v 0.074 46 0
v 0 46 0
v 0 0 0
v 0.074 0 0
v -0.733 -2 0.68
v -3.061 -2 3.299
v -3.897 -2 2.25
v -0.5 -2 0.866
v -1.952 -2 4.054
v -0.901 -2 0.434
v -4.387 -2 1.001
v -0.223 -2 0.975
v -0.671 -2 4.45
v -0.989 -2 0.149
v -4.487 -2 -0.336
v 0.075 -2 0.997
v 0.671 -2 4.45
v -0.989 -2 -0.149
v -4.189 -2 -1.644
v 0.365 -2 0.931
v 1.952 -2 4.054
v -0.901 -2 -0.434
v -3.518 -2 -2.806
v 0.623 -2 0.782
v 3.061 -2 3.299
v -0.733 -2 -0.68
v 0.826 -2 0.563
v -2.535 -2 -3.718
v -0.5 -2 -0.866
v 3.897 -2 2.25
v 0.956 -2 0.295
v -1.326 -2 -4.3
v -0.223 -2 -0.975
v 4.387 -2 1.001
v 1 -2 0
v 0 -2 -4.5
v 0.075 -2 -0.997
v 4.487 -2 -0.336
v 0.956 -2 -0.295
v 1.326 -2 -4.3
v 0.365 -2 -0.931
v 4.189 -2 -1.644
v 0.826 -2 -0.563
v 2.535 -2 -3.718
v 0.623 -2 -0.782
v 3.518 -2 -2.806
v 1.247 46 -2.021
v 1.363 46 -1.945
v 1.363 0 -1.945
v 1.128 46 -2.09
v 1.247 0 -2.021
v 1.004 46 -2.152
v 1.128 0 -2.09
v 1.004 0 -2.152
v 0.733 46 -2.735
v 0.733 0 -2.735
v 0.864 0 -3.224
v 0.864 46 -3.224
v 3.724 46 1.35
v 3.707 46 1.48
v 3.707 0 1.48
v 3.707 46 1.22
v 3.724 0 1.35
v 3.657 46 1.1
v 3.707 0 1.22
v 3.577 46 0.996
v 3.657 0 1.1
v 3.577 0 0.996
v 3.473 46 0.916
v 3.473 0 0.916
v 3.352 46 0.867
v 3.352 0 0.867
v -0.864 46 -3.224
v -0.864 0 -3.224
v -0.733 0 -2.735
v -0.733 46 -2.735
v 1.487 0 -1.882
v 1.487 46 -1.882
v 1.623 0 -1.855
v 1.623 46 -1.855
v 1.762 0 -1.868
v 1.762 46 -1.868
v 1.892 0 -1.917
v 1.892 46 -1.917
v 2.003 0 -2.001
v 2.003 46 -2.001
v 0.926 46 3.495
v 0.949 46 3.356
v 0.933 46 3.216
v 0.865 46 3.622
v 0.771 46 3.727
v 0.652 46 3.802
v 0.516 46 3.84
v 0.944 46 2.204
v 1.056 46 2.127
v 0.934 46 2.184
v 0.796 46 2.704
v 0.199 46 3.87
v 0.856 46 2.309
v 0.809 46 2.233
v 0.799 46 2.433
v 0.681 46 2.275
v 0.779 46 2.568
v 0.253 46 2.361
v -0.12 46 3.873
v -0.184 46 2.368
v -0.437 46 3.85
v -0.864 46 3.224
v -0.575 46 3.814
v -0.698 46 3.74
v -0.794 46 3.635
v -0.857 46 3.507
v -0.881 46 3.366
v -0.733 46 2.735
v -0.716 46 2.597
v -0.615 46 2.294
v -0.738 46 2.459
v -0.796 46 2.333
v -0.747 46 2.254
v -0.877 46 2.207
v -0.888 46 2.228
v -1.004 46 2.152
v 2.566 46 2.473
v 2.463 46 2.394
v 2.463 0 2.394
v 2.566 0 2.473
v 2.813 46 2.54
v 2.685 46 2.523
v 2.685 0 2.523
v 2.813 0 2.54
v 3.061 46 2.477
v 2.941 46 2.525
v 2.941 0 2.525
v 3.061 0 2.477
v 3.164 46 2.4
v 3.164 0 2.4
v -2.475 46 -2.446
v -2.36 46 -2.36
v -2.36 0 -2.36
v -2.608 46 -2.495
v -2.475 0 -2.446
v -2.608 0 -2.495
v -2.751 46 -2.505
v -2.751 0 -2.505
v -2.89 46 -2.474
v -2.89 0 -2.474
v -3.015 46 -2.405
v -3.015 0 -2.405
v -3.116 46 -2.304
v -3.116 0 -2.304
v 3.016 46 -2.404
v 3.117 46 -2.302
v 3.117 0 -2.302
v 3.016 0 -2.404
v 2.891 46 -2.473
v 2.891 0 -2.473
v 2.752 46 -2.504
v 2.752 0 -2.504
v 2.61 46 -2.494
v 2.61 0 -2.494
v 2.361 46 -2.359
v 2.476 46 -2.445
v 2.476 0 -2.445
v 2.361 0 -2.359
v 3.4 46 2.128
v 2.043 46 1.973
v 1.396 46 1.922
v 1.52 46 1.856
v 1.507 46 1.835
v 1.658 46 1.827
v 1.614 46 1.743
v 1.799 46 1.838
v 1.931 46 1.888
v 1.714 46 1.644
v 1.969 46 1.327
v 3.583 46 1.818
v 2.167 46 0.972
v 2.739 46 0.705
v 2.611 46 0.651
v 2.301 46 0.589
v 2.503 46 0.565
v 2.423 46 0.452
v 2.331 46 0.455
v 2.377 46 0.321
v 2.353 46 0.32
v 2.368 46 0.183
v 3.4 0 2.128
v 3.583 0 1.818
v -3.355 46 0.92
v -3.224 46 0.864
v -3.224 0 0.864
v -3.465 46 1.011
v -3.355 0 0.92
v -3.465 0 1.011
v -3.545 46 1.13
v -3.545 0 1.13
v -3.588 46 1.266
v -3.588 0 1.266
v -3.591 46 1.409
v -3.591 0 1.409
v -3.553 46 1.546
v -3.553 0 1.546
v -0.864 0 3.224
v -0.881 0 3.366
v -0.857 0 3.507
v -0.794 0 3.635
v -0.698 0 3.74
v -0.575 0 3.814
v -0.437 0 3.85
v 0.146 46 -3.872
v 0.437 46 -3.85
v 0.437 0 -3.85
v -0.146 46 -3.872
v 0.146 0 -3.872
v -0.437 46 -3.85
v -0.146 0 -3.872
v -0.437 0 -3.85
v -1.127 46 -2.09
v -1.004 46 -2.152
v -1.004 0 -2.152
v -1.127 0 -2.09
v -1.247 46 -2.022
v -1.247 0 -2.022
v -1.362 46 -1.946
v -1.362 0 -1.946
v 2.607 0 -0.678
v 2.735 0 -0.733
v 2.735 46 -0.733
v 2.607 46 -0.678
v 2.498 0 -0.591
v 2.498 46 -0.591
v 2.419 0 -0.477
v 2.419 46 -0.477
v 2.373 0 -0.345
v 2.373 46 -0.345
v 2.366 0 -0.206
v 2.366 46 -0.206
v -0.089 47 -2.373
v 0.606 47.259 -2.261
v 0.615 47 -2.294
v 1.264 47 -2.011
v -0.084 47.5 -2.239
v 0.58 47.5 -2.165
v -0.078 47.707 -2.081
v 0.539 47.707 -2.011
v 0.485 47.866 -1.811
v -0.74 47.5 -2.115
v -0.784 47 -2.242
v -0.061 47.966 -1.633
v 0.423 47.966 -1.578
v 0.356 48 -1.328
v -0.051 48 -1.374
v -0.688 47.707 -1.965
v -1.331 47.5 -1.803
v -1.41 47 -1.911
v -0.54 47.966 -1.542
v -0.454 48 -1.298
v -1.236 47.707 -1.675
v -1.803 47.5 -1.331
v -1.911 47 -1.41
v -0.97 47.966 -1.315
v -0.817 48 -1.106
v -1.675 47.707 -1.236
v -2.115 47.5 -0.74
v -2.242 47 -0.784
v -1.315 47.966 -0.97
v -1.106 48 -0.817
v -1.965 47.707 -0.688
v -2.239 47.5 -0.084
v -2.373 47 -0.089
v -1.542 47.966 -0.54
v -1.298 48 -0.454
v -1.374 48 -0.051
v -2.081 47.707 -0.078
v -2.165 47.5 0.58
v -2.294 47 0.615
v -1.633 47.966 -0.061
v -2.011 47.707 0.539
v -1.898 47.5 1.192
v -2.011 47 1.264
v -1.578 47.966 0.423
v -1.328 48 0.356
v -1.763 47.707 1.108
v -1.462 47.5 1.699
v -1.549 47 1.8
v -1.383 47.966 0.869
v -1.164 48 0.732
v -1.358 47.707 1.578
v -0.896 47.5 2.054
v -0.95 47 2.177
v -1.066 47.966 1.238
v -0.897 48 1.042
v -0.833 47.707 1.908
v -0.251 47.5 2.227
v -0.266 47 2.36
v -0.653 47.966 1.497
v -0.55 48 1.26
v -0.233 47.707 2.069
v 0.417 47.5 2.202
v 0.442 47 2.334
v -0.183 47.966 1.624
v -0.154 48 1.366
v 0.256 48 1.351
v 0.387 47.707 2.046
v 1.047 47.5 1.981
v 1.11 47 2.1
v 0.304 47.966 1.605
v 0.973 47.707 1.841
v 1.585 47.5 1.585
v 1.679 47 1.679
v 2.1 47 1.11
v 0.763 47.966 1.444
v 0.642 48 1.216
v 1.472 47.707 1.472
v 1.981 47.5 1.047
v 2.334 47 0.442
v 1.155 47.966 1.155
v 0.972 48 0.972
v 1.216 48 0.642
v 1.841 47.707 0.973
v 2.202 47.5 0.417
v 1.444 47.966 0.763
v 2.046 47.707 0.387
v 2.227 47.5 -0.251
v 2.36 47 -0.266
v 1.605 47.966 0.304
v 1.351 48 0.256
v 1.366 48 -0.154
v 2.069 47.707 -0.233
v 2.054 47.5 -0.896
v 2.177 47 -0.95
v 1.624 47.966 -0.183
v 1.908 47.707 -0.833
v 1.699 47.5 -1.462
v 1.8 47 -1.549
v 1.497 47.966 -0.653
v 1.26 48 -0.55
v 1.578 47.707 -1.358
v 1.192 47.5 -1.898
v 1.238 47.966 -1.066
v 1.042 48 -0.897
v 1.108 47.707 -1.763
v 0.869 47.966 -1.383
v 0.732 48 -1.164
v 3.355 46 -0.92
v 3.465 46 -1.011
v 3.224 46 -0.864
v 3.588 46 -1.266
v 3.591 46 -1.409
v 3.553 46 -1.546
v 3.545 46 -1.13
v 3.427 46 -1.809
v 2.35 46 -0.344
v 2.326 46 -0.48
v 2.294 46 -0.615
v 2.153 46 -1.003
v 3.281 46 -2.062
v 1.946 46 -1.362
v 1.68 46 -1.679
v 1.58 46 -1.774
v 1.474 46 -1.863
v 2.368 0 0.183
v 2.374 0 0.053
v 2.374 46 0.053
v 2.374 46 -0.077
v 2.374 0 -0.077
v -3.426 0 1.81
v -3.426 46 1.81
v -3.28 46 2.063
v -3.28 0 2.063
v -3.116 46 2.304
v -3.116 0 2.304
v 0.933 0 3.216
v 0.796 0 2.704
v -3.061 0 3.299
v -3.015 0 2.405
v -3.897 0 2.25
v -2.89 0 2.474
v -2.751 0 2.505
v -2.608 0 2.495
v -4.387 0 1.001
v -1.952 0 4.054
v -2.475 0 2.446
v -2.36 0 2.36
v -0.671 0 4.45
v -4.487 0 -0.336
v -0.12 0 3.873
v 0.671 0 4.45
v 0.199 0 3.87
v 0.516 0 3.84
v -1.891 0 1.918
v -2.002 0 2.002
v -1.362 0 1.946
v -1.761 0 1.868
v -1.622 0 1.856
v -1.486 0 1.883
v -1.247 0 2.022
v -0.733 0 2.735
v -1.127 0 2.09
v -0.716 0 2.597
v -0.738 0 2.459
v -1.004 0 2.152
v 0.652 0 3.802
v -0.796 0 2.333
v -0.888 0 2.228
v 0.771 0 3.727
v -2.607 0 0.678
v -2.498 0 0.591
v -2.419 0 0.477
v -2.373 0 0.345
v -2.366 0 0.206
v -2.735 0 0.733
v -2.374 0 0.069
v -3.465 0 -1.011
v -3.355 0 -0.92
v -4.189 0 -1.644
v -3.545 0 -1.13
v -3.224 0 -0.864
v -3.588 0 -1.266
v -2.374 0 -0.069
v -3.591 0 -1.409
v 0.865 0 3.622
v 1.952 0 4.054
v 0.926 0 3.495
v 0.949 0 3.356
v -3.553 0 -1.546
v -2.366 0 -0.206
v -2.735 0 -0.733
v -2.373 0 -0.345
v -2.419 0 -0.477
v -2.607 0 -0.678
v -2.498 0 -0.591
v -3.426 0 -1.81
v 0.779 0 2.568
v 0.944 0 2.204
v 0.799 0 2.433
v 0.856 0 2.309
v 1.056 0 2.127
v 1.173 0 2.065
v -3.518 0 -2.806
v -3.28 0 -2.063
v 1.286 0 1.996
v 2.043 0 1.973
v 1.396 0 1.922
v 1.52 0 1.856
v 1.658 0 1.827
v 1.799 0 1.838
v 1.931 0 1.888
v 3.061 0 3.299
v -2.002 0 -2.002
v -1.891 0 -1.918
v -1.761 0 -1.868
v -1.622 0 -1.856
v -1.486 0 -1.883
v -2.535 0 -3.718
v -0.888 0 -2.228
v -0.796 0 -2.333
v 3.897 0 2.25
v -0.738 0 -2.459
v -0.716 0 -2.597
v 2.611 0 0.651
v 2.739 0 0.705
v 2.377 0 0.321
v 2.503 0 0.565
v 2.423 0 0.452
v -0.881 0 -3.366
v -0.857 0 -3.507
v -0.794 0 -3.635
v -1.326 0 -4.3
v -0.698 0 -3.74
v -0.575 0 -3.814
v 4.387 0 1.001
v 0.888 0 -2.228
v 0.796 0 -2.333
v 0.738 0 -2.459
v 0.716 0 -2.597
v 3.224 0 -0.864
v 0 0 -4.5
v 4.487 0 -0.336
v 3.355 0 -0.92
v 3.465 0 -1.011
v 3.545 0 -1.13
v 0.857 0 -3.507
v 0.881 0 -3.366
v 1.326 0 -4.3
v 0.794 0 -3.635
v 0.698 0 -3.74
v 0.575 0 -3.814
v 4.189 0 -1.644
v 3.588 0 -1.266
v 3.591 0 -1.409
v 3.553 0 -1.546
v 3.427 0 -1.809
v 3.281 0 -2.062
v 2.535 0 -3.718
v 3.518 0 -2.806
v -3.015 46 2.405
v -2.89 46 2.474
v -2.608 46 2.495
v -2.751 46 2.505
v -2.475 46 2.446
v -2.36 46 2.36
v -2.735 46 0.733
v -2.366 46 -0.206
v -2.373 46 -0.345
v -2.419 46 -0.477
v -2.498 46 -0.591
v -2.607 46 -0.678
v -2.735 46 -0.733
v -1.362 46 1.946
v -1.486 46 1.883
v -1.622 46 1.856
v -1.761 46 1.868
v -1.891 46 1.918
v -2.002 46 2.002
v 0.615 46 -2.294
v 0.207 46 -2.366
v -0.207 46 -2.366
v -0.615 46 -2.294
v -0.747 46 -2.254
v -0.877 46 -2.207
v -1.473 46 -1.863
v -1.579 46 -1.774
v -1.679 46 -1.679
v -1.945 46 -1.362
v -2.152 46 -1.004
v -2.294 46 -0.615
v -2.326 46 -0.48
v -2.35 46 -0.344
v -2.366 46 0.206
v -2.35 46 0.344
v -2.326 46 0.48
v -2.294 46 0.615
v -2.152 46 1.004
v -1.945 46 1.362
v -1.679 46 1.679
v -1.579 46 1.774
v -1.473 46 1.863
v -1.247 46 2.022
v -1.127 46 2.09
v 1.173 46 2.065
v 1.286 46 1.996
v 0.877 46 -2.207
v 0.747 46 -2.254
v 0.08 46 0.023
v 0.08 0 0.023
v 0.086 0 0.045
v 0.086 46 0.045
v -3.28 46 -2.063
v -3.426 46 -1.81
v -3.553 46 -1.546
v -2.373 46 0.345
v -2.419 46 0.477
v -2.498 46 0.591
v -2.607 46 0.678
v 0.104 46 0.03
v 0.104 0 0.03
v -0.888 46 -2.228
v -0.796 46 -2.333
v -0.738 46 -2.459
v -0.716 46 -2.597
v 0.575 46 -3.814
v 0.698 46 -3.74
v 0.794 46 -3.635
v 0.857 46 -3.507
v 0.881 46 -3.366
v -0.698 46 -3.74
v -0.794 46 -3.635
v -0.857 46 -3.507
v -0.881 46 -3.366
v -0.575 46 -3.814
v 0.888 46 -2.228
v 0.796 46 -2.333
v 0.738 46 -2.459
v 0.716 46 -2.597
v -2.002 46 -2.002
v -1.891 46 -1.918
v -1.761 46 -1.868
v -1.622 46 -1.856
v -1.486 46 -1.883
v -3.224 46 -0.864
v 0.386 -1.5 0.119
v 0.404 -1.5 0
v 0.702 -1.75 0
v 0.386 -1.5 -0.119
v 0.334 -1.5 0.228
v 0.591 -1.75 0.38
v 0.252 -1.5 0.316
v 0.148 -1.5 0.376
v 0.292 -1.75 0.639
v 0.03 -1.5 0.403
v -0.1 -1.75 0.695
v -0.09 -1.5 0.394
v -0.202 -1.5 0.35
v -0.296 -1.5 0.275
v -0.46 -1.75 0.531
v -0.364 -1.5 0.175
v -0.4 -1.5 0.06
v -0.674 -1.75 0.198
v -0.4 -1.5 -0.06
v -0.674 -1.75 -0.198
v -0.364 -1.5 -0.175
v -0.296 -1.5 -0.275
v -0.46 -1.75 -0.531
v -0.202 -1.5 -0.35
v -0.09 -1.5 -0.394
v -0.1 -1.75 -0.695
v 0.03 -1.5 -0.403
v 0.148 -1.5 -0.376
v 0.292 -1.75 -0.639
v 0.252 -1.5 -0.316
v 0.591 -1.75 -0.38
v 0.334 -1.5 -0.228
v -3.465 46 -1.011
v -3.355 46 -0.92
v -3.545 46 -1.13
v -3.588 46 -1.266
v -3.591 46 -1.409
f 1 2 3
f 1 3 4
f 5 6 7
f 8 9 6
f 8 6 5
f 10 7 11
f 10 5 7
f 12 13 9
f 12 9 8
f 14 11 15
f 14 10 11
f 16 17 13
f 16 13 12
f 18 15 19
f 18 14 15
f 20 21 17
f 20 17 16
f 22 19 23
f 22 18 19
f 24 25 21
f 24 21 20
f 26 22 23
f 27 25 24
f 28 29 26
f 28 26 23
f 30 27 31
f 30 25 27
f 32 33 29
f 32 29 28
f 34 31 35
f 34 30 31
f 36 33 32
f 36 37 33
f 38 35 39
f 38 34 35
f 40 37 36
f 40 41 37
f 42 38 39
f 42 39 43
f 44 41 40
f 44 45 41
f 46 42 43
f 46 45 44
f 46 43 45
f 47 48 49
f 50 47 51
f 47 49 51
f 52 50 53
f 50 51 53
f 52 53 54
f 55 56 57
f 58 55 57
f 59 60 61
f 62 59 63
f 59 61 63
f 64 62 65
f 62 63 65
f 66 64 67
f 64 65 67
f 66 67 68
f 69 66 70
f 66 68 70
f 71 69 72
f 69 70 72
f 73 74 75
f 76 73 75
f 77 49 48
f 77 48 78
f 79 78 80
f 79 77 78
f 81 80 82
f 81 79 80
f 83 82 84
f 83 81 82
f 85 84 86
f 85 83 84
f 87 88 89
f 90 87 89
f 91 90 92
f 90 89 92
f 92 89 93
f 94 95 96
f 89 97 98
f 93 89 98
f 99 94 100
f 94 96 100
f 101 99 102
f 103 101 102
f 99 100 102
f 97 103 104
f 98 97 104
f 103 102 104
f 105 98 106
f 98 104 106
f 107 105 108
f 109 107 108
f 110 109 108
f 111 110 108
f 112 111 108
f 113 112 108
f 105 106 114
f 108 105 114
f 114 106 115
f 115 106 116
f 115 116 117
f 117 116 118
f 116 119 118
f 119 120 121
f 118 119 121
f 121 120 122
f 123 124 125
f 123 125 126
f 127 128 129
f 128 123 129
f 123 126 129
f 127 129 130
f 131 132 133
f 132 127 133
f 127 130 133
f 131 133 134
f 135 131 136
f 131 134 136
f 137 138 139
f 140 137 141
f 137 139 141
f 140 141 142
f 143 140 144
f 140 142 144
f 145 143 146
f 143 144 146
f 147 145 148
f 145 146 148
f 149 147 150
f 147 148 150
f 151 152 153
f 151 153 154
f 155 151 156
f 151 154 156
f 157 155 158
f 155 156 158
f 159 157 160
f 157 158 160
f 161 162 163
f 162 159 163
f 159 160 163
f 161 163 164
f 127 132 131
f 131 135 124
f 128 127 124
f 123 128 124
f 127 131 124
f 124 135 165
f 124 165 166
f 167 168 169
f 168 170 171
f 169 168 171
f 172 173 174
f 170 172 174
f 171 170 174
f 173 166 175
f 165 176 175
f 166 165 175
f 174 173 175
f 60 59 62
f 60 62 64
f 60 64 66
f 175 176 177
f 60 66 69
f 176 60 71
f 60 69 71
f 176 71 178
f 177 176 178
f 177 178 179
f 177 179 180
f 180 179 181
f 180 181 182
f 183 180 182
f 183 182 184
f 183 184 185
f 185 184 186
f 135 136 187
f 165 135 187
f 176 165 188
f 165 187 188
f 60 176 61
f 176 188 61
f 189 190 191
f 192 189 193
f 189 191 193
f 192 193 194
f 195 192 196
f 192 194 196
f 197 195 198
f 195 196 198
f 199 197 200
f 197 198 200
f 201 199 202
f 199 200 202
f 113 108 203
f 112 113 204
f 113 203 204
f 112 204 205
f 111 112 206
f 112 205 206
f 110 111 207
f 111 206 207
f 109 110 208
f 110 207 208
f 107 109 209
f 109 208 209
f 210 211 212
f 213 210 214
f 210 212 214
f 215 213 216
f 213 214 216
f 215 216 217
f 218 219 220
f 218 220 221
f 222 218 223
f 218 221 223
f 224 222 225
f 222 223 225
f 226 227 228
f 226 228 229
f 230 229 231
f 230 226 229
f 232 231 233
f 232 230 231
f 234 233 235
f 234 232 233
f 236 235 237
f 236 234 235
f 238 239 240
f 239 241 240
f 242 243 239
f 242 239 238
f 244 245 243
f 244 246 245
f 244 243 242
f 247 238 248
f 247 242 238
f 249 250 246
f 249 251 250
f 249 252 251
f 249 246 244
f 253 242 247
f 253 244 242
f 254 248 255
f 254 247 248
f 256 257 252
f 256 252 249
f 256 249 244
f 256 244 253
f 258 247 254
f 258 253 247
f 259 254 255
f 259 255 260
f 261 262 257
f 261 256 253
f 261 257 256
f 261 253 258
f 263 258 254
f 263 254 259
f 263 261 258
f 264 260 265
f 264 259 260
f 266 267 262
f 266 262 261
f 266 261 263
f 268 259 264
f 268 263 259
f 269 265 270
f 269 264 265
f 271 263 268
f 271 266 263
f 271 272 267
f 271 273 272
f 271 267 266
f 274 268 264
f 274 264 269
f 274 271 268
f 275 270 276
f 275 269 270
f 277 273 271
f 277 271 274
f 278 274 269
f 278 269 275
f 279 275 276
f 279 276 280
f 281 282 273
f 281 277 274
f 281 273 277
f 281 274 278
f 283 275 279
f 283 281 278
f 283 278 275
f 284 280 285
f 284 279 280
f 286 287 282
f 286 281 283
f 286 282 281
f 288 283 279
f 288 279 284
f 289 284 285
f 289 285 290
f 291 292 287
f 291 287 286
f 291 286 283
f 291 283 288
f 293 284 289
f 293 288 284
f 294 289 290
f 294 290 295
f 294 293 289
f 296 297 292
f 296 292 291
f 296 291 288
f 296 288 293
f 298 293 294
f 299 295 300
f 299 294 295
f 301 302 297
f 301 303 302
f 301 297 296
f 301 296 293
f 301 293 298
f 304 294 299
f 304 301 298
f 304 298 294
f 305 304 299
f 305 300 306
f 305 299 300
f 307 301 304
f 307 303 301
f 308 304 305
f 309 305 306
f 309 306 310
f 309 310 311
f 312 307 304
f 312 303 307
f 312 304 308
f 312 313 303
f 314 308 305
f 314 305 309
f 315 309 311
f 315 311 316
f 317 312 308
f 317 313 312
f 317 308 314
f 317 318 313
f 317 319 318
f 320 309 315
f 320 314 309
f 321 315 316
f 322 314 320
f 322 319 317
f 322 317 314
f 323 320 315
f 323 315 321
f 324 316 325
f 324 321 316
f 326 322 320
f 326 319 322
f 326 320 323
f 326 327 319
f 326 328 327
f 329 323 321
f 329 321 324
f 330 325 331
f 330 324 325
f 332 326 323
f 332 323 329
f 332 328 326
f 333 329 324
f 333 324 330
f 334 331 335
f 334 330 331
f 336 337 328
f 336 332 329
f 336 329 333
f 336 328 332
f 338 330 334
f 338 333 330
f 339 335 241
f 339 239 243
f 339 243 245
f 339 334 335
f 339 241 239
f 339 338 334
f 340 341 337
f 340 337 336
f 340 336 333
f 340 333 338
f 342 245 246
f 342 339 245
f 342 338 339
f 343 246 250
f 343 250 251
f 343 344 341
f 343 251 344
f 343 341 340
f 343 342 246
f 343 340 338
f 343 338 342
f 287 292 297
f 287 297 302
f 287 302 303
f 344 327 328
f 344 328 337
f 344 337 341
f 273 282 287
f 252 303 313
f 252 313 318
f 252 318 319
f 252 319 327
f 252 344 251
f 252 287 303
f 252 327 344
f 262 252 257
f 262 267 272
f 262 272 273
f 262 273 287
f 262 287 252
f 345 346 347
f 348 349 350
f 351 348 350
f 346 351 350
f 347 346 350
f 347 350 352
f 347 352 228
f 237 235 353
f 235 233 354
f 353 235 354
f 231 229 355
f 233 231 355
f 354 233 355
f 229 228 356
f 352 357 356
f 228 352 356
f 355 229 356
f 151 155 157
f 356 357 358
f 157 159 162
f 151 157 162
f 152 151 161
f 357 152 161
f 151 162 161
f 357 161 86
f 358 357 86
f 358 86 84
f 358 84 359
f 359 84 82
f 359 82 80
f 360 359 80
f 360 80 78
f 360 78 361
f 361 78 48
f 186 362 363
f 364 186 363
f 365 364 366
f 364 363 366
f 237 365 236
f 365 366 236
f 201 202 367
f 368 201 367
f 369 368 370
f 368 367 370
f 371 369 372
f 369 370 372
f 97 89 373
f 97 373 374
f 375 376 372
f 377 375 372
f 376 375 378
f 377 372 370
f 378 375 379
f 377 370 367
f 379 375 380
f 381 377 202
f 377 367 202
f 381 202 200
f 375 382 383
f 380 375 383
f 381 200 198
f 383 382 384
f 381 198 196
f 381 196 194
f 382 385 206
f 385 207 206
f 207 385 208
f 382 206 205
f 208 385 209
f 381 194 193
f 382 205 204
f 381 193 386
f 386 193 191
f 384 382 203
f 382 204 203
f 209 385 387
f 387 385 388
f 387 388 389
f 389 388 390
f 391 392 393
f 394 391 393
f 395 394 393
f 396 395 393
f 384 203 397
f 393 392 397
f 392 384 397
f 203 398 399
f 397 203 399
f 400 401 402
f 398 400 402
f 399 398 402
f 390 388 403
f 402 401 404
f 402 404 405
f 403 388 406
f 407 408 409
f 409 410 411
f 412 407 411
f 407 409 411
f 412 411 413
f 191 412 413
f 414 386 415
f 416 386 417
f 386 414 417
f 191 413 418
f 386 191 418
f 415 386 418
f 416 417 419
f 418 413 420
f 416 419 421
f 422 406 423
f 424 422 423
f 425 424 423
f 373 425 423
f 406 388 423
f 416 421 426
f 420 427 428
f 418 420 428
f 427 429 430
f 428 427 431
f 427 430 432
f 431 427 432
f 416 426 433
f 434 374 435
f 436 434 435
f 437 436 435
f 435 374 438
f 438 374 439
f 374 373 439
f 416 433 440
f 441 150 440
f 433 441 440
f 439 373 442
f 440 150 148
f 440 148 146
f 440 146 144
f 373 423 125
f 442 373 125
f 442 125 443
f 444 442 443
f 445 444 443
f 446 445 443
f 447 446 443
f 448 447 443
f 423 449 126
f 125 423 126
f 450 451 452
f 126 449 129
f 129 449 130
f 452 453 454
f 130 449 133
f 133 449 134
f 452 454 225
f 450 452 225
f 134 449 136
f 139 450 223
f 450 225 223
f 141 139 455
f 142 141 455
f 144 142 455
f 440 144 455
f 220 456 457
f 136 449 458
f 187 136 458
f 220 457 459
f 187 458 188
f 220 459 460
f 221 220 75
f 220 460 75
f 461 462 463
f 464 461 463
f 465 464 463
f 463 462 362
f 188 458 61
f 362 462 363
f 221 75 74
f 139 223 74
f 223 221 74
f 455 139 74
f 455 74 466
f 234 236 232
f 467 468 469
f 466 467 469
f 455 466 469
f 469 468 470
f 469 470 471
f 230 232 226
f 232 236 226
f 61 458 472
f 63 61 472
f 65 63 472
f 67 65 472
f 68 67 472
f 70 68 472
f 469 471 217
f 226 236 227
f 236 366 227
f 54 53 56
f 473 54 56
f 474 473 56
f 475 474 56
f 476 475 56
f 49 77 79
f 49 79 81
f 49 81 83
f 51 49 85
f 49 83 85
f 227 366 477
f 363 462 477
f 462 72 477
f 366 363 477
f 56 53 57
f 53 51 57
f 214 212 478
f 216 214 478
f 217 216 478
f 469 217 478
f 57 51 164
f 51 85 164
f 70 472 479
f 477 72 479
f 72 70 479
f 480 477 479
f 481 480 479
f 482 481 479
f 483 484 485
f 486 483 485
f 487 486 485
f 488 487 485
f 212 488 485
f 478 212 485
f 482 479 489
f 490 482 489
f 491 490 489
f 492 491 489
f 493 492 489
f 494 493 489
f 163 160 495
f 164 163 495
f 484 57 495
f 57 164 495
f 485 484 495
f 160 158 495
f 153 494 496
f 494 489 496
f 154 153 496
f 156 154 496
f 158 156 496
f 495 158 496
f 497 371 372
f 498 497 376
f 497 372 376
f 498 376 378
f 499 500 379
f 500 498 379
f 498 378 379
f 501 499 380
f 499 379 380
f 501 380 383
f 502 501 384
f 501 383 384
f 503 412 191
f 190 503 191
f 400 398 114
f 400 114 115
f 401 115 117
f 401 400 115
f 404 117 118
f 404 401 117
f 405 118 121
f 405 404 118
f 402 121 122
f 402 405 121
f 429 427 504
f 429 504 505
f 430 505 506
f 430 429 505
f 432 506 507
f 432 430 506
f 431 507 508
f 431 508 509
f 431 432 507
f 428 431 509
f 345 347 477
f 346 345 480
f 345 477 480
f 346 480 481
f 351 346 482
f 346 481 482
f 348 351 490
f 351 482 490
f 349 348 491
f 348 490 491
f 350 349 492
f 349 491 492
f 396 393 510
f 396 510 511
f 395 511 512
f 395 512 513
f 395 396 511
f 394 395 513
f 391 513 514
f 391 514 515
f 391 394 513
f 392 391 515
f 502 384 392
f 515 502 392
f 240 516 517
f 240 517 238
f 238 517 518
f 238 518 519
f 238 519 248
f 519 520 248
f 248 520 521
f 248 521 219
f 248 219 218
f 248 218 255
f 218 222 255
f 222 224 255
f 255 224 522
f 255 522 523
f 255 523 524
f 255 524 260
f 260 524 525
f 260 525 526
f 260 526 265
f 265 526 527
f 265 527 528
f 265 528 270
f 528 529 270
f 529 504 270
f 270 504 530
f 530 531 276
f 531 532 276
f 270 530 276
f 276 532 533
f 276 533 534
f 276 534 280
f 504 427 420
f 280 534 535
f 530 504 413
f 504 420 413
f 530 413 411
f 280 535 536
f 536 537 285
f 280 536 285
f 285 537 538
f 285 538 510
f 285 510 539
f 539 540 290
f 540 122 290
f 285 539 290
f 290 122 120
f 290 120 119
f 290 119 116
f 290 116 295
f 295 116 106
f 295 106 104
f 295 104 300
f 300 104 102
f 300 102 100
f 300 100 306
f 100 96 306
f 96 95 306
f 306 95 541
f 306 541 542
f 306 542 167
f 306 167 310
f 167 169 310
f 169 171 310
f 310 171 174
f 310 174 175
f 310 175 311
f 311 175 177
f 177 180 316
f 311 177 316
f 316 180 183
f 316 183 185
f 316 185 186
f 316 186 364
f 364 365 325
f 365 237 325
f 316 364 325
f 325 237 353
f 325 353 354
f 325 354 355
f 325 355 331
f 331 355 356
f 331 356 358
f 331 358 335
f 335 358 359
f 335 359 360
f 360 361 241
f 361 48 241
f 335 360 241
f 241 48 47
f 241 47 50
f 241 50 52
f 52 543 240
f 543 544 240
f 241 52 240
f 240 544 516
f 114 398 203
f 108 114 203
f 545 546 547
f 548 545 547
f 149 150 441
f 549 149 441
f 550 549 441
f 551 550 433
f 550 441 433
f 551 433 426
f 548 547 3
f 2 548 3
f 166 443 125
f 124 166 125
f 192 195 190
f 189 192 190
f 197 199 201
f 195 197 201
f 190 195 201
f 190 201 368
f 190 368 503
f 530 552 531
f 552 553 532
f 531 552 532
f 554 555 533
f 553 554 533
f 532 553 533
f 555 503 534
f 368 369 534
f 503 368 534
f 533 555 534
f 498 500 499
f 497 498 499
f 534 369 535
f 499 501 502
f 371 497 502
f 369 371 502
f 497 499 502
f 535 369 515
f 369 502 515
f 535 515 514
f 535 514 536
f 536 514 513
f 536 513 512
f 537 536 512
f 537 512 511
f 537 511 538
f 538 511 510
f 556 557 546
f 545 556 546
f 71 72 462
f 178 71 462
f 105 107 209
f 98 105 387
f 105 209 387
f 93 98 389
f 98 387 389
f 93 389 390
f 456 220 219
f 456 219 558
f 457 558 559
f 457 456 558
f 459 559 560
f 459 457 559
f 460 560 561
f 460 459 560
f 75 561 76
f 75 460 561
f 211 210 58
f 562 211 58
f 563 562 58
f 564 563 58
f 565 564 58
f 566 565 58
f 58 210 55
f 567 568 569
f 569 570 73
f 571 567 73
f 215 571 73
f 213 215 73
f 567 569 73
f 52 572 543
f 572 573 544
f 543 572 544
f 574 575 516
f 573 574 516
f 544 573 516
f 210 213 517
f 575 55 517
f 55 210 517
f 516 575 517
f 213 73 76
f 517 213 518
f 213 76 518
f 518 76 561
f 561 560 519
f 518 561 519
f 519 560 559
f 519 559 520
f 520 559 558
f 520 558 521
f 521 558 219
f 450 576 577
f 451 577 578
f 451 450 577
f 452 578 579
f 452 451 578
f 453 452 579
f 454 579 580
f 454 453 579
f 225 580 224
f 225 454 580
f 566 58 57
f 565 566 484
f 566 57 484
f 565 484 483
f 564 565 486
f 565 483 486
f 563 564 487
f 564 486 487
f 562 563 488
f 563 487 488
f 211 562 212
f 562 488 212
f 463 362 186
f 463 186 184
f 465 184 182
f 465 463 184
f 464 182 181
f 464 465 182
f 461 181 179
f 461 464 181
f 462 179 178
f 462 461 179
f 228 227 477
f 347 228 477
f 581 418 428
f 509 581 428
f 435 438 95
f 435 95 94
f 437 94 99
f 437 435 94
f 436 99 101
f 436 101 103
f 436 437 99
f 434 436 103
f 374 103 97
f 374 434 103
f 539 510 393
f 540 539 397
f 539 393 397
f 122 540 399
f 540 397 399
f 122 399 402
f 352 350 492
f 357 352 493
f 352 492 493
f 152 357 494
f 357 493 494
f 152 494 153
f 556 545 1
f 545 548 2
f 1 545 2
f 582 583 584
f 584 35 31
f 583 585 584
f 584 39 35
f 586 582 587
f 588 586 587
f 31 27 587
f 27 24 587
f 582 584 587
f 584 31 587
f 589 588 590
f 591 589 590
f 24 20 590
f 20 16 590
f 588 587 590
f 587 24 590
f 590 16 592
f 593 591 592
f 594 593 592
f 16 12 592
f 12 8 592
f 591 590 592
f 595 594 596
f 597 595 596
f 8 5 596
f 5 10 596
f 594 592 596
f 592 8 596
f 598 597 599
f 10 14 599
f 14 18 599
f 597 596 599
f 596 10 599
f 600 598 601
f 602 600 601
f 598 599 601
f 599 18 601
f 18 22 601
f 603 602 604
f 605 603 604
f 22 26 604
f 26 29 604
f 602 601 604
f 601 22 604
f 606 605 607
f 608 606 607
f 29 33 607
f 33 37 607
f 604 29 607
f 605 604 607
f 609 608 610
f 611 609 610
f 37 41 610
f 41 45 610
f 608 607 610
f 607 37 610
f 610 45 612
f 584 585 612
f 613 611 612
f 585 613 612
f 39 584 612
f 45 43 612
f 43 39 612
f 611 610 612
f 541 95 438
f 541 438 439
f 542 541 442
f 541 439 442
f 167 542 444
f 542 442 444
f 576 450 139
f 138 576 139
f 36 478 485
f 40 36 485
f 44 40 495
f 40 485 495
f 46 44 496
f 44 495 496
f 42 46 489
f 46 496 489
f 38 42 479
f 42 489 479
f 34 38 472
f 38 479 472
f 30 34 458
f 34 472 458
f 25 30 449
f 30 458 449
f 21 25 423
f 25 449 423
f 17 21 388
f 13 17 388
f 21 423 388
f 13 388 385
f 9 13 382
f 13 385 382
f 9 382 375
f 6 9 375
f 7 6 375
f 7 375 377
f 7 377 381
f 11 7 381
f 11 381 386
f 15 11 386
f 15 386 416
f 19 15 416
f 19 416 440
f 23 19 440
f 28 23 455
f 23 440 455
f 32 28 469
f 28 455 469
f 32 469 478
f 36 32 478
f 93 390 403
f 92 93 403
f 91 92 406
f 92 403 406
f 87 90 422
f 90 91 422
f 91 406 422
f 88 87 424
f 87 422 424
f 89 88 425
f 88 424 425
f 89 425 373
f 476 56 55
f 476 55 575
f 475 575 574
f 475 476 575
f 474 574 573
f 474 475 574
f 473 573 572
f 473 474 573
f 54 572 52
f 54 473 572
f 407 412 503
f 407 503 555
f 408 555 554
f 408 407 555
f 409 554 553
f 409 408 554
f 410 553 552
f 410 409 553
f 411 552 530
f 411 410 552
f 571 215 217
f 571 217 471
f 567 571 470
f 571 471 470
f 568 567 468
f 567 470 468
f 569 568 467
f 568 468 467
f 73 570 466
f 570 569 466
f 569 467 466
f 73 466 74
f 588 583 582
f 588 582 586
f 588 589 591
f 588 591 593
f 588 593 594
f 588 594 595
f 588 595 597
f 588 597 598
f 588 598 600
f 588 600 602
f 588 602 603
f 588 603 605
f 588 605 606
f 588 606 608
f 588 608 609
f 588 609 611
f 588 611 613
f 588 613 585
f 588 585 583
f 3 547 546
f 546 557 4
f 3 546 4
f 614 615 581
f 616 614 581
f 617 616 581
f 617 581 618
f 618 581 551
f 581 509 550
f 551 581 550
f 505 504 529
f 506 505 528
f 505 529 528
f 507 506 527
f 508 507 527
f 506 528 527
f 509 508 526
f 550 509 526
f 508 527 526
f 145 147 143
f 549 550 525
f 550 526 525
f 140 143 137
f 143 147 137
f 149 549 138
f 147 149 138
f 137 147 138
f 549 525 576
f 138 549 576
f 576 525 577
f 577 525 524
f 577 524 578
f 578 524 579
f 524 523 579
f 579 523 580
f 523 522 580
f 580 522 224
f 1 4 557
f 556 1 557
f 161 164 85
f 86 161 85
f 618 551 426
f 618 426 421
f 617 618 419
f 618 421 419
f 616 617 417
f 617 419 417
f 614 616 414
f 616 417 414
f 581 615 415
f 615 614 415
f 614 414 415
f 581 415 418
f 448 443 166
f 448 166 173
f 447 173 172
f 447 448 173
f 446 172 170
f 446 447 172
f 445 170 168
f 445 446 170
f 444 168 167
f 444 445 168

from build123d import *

# Parameters (mm, degrees)
BOSS_EXTRUDE1_DEPTH = 46
SKETCH3_R           = 4.5
BOSS_EXTRUDE2_DEPTH = 2
SKETCH4_R           = 2.375
BOSS_EXTRUDE3_DEPTH = 2
FILLET1_R           = 0.5
SKETCH6_R           = 1
CUT_EXTRUDE4_DEPTH  = 0.5
CUT_EXTRUDE4_DRAFT  = -50
FILLET2_R           = 1


with BuildPart() as part:
    # Sketch2 → Boss-Extrude1 (new body)
    with BuildSketch(Plane(origin=(0, 0, 0), x_dir=(1, 0, 0), z_dir=(0, 1, 0))):
        with BuildLine():
            Line((3.775215965, -0.978645895), (2.300774305, -0.58912019))
            ThreePointArc((2.300774305, -0.58912019), (2.374963211, 0.013219106), (2.294073837, 0.614695232))
            Line((2.294073837, 0.614695232), (3.742962577, 1.0029238))
            ThreePointArc((3.742962577, 1.0029238), (3.356294138, 1.936727823), (2.741299364, 2.73877761))
            Line((2.741299364, 2.73877761), (1.680151223, 1.678605632))
            ThreePointArc((1.680151223, 1.678605632), (1.187973207, 2.056537055), (0.614695232, 2.294073837))
            Line((0.614695232, 2.294073837), (1.0029238, 3.742962577))
            ThreePointArc((1.0029238, 3.742962577), (0, 3.875), (-1.0029238, 3.742962577))
            Line((-1.0029238, 3.742962577), (-0.614695232, 2.294073837))
            ThreePointArc((-0.614695232, 2.294073837), (-1.1875, 2.056810334), (-1.679378605, 1.679378605))
            Line((-1.679378605, 1.679378605), (-2.740038777, 2.740038777))
            ThreePointArc((-2.740038777, 2.740038777), (-3.35584844, 1.9375), (-3.742962577, 1.0029238))
            Line((-3.742962577, 1.0029238), (-2.294073837, 0.614695232))
            ThreePointArc((-2.294073837, 0.614695232), (-2.375, 0), (-2.294073837, -0.614695232))
            Line((-2.294073837, -0.614695232), (-3.742962577, -1.0029238))
            ThreePointArc((-3.742962577, -1.0029238), (-3.35584844, -1.9375), (-2.740038777, -2.740038777))
            Line((-2.740038777, -2.740038777), (-1.679378605, -1.679378605))
            ThreePointArc((-1.679378605, -1.679378605), (-1.1875, -2.056810334), (-0.614695232, -2.294073837))
            Line((-0.614695232, -2.294073837), (-1.0029238, -3.742962577))
            ThreePointArc((-1.0029238, -3.742962577), (0.033967076, -3.874851125), (1.068386506, -3.724805401))
            Line((1.068386506, -3.724805401), (0.681359786, -2.275164575))
            ThreePointArc((0.681359786, -2.275164575), (1.238849907, -2.026296106), (1.714477211, -1.643530618))
            Line((1.714477211, -1.643530618), (2.767163136, -2.698133353))
            ThreePointArc((2.767163136, -2.698133353), (3.500652231, -1.972912562), (3.775215965, -0.978645895))
        make_face()
        Polygon((0.085836926, -0.044584082), (0, 0), (0.073933818, 0), (0.104207494, -0.030328801), (0.080162685, -0.023330742), align=None, mode=Mode.SUBTRACT)
    extrude(amount=BOSS_EXTRUDE1_DEPTH)

    # Sketch3 → Boss-Extrude2 (add)
    with BuildSketch(Plane.XZ):
        with Locations(Location((0, 0, 0), (0, 0, 270))):
            Circle(SKETCH3_R)
    extrude(amount=BOSS_EXTRUDE2_DEPTH)

    # Sketch4 → Boss-Extrude3 (add)
    with BuildSketch(Plane(origin=(0, 46, 0), x_dir=(1, 0, 0), z_dir=(0, 1, 0))):
        with Locations(Location((0, 0, 0), (0, 0, 75))):
            Circle(SKETCH4_R)
    extrude(amount=BOSS_EXTRUDE3_DEPTH)

    # Fillet1
    # the kernel refuses this fillet: 0.5 mm, written as the material it adds along each edge
    with BuildSketch(Plane(origin=(-2.294073837, -1.140469783, 0.614695232), x_dir=(-0.965925826289068, 0, 0.2588190451025218), z_dir=(0, 1, 0)), Plane(origin=(-1.679378605, -1.140469783, -1.679378605), x_dir=(-0.7071067811865478, 0, -0.7071067811865474), z_dir=(0, 1, 0)), Plane(origin=(0.614695232, -1.140469783, -2.294073837), x_dir=(0.2588190451025215, 0, -0.9659258262890681), z_dir=(0, 1, 0)), Plane(origin=(2.294073837, -1.140469783, -0.614695232), x_dir=(0.9659258262890681, 0, -0.2588190451025215), z_dir=(0, 1, 0)), Plane(origin=(-0.614695232, -1.140469783, 2.294073837), x_dir=(-0.2588190451025215, 0, 0.9659258262890681), z_dir=(0, 1, 0))) as fillet1_piece_1:
        with BuildLine():
            CenterArc((0.456187913, -0.5), FILLET1_R, 90, 79.984589832)
            ThreePointArc((-0.036192593, -0.413043478), (-0.00906545, -0.20731306), (0, 0))
            Line((0, 0), (0.456187913, 0))
        make_face()
    extrude(amount=47.140469783)
    with BuildSketch(Plane(origin=(-2.294073837, -1.140469783, -0.614695232), x_dir=(-0.17351574004952178, 0, 0.9848310961556133), z_dir=(0, 1, 0)), Plane(origin=(-1.679378605, -1.140469783, 1.679378605), x_dir=(0.7661308776828862, 0, 0.6426845869171364), z_dir=(0, 1, 0))) as fillet1_piece_2:
        with BuildLine():
            CenterArc((0.458270974, -0.498091484), FILLET1_R, 95.007705084, 79.984589832)
            Line((-0.03982051, -0.45444663), (0, 0))
            ThreePointArc((0, 0), (0.20731306, -0.00906545), (0.414626119, 0))
        make_face()
    extrude(amount=47.140469783)
    with BuildSketch(Plane(origin=(-0.614695232, -1.140469783, -2.294073837), x_dir=(-0.258819045102522, 0, -0.965925826289068), z_dir=(0, 1, 0)), Plane(origin=(1.680151223, -1.140469783, -1.678605632), x_dir=(0.707432093873984, 0, -0.7067813187663288), z_dir=(0, 1, 0))) as fillet1_piece_3:
        with BuildLine():
            CenterArc((0.456187913, 0.5), FILLET1_R, 190.015410168, 79.984589832)
            ThreePointArc((-0.036192593, 0.413043478), (-0.00906545, 0.20731306), (0, 0))
            Line((0, 0), (0.456187913, 0))
        make_face()
    extrude(amount=47.140469783)
    with BuildSketch(Plane(origin=(2.300774305, -1.132506036, 0.58912019), x_dir=(0.16314582309469597, 0, -0.9866019665532569), z_dir=(0, 1, 0))) as fillet1_piece_4:
        with BuildLine():
            CenterArc((0.455070929, -0.498118095), FILLET1_R, 94.972648578, 79.61829146)
            Line((-0.042702606, -0.450985227), (0, 0))
            ThreePointArc((0, 0), (0.20586542, -0.008939048), (0.411730841, 0))
        make_face()
    extrude(amount=47.132506036)
    with BuildSketch(Plane(origin=(1.714477211, -1.163771178, 1.643530618), x_dir=(0.7064632978713467, 0, 0.7077496794494088), z_dir=(0, 1, 0))) as fillet1_piece_5:
        with BuildLine():
            CenterArc((0.465508471, -0.5), FILLET1_R, 90, 81.041880237)
            ThreePointArc((-0.02839274, -0.422143763), (-0.00477723, -0.211705398), (0, 0))
            Line((0, 0), (0.465508471, 0))
        make_face()
    extrude(amount=47.163771178)
    with BuildSketch(Plane(origin=(0.681359786, -1.109284133, 2.275164575), x_dir=(0.9301474254657973, 0, -0.3671862836481626), z_dir=(0, 1, 0))) as fillet1_piece_6:
        with BuildLine():
            CenterArc((0.445739753, -0.498194619), FILLET1_R, 94.870436099, 78.535607624)
            Line((-0.050952689, -0.440778436), (0, 0))
            ThreePointArc((0, 0), (0.201644174, -0.008575561), (0.403288348, 0))
        make_face()
    extrude(amount=47.109284133)
    # the kernel refuses this fillet: 0.5 mm, written as the material it takes off along each edge
    with BuildSketch(Plane(origin=(-2.740038777, 0, 2.740038777), x_dir=(-0.6526300069150477, 0, -0.7576767609436524), z_dir=(0, 1, 0)), Plane(origin=(-3.742962577, 0, -1.0029238), x_dir=(0.32985231937679765, 0, -0.9440325457322681), z_dir=(0, 1, 0)), Plane(origin=(-1.0029238, 0, -3.742962577), x_dir=(0.982482326291838, 0, -0.18635578478860887), z_dir=(0, 1, 0)), Plane(origin=(2.741299364, 0, -2.73877761), x_dir=(0.6522812796019254, 0, 0.7579769998363239), z_dir=(0, 1, 0))) as fillet1_2_piece_1:
        with BuildLine():
            CenterArc((0.538524723, -0.49861874), FILLET1_R, 85.740187873, 98.519624254)
            Line((0.039905983, -0.535758376), (0, 0))
            ThreePointArc((0, 0), (0.287832179, 0.010704768), (0.575664359, 0))
        make_face()
    extrude(amount=47.439160897, mode=Mode.SUBTRACT)
    with BuildSketch(Plane(origin=(-3.742962577, 0, 1.0029238), x_dir=(0.9659258262890679, 0, -0.2588190451025218), z_dir=(0, 1, 0)), Plane(origin=(-2.740038777, 0, -2.740038777), x_dir=(0.7071067811865476, 0, 0.7071067811865476), z_dir=(0, 1, 0)), Plane(origin=(1.0029238, 0, -3.742962577), x_dir=(-0.25881904510252196, 0, 0.965925826289068), z_dir=(0, 1, 0)), Plane(origin=(3.742962577, 0, -1.0029238), x_dir=(-0.9659258262890681, 0, 0.25881904510252185), z_dir=(0, 1, 0)), Plane(origin=(-1.0029238, 0, 3.742962577), x_dir=(0.2588190451025216, 0, -0.9659258262890681), z_dir=(0, 1, 0))) as fillet1_2_piece_2:
        with BuildLine():
            CenterArc((0.537242519, -0.5), FILLET1_R, 90, 98.519624254)
            ThreePointArc((0.04275993, -0.574074074), (0.010704768, -0.287832179), (0, 0))
            Line((0, 0), (0.537242519, 0))
        make_face()
    extrude(amount=47.439160897, mode=Mode.SUBTRACT)
    with BuildSketch(Plane(origin=(3.775215965, 0, 0.978645895), x_dir=(-0.13498089829276533, 0, 0.9908482008340522), z_dir=(0, 1, 0))) as fillet1_2_piece_3:
        with BuildLine():
            CenterArc((0.442538799, -0.49598715), FILLET1_R, 82.736098253, 90.22281865)
            Line((-0.053690457, -0.434696649), (0, 0))
            ThreePointArc((0, 0), (0.252879314, 0.016051399), (0.505758627, 0))
        make_face()
    extrude(amount=47.264396568, mode=Mode.SUBTRACT)
    with BuildSketch(Plane(origin=(2.767163136, 0, 2.698133353), x_dir=(0.8000663385432955, 0, -0.5999115384203949), z_dir=(0, 1, 0))) as fillet1_2_piece_4:
        with BuildLine():
            CenterArc((0.434547354, 0.496131331), FILLET1_R, 188.084320914, 89.047719887)
            Line((-0.060483736, 0.425816179), (0, 0))
            ThreePointArc((0, 0), (0.248312773, -0.015474675), (0.496625547, 0))
        make_face()
    extrude(amount=47.241563867, mode=Mode.SUBTRACT)
    with BuildSketch(Plane(origin=(1.068386506, 0, 3.724805401), x_dir=(-0.9787647804449897, 0, 0.20498659605074468), z_dir=(0, 1, 0))) as fillet1_2_piece_5:
        with BuildLine():
            CenterArc((0.527919562, -0.498672678), FILLET1_R, 85.824226653, 97.295295094)
            Line((0.028660468, -0.525882193), (0, 0))
            ThreePointArc((0, 0), (0.282163904, 0.010286747), (0.564327807, 0))
        make_face()
    extrude(amount=47.410819518, mode=Mode.SUBTRACT)


with BuildPart() as cut_extrude4_tool:
    # Sketch6 → Cut-Extrude4 (with draft: the straight prism first)
    with BuildSketch(Plane.XZ.offset(2)):
        Circle(SKETCH6_R)
    extrude(amount=-CUT_EXTRUDE4_DEPTH)
    # Cut-Extrude4: the draft: its side faces are tilted about the plane it starts from
    cut_extrude4_sides = [cut_extrude4_tool.faces().sort_by_distance(p)[0] for p in [
        (-1, -1.75, 0),
    ]]
    draft(cut_extrude4_sides, Plane.XZ.offset(2), CUT_EXTRUDE4_DRAFT)


with BuildPart() as part_1:
    add(part.part)

    # Cut-Extrude4: cut by cut_extrude4_tool
    add(cut_extrude4_tool.part, mode=Mode.SUBTRACT)

    # Fillet2
    fillet2_edges = [part_1.edges().sort_by_distance(p)[0] for p in [
        (-0.614695232, 48, 2.294073837),
    ]]
    fillet(fillet2_edges, radius=FILLET2_R)


solid = part_1.part
